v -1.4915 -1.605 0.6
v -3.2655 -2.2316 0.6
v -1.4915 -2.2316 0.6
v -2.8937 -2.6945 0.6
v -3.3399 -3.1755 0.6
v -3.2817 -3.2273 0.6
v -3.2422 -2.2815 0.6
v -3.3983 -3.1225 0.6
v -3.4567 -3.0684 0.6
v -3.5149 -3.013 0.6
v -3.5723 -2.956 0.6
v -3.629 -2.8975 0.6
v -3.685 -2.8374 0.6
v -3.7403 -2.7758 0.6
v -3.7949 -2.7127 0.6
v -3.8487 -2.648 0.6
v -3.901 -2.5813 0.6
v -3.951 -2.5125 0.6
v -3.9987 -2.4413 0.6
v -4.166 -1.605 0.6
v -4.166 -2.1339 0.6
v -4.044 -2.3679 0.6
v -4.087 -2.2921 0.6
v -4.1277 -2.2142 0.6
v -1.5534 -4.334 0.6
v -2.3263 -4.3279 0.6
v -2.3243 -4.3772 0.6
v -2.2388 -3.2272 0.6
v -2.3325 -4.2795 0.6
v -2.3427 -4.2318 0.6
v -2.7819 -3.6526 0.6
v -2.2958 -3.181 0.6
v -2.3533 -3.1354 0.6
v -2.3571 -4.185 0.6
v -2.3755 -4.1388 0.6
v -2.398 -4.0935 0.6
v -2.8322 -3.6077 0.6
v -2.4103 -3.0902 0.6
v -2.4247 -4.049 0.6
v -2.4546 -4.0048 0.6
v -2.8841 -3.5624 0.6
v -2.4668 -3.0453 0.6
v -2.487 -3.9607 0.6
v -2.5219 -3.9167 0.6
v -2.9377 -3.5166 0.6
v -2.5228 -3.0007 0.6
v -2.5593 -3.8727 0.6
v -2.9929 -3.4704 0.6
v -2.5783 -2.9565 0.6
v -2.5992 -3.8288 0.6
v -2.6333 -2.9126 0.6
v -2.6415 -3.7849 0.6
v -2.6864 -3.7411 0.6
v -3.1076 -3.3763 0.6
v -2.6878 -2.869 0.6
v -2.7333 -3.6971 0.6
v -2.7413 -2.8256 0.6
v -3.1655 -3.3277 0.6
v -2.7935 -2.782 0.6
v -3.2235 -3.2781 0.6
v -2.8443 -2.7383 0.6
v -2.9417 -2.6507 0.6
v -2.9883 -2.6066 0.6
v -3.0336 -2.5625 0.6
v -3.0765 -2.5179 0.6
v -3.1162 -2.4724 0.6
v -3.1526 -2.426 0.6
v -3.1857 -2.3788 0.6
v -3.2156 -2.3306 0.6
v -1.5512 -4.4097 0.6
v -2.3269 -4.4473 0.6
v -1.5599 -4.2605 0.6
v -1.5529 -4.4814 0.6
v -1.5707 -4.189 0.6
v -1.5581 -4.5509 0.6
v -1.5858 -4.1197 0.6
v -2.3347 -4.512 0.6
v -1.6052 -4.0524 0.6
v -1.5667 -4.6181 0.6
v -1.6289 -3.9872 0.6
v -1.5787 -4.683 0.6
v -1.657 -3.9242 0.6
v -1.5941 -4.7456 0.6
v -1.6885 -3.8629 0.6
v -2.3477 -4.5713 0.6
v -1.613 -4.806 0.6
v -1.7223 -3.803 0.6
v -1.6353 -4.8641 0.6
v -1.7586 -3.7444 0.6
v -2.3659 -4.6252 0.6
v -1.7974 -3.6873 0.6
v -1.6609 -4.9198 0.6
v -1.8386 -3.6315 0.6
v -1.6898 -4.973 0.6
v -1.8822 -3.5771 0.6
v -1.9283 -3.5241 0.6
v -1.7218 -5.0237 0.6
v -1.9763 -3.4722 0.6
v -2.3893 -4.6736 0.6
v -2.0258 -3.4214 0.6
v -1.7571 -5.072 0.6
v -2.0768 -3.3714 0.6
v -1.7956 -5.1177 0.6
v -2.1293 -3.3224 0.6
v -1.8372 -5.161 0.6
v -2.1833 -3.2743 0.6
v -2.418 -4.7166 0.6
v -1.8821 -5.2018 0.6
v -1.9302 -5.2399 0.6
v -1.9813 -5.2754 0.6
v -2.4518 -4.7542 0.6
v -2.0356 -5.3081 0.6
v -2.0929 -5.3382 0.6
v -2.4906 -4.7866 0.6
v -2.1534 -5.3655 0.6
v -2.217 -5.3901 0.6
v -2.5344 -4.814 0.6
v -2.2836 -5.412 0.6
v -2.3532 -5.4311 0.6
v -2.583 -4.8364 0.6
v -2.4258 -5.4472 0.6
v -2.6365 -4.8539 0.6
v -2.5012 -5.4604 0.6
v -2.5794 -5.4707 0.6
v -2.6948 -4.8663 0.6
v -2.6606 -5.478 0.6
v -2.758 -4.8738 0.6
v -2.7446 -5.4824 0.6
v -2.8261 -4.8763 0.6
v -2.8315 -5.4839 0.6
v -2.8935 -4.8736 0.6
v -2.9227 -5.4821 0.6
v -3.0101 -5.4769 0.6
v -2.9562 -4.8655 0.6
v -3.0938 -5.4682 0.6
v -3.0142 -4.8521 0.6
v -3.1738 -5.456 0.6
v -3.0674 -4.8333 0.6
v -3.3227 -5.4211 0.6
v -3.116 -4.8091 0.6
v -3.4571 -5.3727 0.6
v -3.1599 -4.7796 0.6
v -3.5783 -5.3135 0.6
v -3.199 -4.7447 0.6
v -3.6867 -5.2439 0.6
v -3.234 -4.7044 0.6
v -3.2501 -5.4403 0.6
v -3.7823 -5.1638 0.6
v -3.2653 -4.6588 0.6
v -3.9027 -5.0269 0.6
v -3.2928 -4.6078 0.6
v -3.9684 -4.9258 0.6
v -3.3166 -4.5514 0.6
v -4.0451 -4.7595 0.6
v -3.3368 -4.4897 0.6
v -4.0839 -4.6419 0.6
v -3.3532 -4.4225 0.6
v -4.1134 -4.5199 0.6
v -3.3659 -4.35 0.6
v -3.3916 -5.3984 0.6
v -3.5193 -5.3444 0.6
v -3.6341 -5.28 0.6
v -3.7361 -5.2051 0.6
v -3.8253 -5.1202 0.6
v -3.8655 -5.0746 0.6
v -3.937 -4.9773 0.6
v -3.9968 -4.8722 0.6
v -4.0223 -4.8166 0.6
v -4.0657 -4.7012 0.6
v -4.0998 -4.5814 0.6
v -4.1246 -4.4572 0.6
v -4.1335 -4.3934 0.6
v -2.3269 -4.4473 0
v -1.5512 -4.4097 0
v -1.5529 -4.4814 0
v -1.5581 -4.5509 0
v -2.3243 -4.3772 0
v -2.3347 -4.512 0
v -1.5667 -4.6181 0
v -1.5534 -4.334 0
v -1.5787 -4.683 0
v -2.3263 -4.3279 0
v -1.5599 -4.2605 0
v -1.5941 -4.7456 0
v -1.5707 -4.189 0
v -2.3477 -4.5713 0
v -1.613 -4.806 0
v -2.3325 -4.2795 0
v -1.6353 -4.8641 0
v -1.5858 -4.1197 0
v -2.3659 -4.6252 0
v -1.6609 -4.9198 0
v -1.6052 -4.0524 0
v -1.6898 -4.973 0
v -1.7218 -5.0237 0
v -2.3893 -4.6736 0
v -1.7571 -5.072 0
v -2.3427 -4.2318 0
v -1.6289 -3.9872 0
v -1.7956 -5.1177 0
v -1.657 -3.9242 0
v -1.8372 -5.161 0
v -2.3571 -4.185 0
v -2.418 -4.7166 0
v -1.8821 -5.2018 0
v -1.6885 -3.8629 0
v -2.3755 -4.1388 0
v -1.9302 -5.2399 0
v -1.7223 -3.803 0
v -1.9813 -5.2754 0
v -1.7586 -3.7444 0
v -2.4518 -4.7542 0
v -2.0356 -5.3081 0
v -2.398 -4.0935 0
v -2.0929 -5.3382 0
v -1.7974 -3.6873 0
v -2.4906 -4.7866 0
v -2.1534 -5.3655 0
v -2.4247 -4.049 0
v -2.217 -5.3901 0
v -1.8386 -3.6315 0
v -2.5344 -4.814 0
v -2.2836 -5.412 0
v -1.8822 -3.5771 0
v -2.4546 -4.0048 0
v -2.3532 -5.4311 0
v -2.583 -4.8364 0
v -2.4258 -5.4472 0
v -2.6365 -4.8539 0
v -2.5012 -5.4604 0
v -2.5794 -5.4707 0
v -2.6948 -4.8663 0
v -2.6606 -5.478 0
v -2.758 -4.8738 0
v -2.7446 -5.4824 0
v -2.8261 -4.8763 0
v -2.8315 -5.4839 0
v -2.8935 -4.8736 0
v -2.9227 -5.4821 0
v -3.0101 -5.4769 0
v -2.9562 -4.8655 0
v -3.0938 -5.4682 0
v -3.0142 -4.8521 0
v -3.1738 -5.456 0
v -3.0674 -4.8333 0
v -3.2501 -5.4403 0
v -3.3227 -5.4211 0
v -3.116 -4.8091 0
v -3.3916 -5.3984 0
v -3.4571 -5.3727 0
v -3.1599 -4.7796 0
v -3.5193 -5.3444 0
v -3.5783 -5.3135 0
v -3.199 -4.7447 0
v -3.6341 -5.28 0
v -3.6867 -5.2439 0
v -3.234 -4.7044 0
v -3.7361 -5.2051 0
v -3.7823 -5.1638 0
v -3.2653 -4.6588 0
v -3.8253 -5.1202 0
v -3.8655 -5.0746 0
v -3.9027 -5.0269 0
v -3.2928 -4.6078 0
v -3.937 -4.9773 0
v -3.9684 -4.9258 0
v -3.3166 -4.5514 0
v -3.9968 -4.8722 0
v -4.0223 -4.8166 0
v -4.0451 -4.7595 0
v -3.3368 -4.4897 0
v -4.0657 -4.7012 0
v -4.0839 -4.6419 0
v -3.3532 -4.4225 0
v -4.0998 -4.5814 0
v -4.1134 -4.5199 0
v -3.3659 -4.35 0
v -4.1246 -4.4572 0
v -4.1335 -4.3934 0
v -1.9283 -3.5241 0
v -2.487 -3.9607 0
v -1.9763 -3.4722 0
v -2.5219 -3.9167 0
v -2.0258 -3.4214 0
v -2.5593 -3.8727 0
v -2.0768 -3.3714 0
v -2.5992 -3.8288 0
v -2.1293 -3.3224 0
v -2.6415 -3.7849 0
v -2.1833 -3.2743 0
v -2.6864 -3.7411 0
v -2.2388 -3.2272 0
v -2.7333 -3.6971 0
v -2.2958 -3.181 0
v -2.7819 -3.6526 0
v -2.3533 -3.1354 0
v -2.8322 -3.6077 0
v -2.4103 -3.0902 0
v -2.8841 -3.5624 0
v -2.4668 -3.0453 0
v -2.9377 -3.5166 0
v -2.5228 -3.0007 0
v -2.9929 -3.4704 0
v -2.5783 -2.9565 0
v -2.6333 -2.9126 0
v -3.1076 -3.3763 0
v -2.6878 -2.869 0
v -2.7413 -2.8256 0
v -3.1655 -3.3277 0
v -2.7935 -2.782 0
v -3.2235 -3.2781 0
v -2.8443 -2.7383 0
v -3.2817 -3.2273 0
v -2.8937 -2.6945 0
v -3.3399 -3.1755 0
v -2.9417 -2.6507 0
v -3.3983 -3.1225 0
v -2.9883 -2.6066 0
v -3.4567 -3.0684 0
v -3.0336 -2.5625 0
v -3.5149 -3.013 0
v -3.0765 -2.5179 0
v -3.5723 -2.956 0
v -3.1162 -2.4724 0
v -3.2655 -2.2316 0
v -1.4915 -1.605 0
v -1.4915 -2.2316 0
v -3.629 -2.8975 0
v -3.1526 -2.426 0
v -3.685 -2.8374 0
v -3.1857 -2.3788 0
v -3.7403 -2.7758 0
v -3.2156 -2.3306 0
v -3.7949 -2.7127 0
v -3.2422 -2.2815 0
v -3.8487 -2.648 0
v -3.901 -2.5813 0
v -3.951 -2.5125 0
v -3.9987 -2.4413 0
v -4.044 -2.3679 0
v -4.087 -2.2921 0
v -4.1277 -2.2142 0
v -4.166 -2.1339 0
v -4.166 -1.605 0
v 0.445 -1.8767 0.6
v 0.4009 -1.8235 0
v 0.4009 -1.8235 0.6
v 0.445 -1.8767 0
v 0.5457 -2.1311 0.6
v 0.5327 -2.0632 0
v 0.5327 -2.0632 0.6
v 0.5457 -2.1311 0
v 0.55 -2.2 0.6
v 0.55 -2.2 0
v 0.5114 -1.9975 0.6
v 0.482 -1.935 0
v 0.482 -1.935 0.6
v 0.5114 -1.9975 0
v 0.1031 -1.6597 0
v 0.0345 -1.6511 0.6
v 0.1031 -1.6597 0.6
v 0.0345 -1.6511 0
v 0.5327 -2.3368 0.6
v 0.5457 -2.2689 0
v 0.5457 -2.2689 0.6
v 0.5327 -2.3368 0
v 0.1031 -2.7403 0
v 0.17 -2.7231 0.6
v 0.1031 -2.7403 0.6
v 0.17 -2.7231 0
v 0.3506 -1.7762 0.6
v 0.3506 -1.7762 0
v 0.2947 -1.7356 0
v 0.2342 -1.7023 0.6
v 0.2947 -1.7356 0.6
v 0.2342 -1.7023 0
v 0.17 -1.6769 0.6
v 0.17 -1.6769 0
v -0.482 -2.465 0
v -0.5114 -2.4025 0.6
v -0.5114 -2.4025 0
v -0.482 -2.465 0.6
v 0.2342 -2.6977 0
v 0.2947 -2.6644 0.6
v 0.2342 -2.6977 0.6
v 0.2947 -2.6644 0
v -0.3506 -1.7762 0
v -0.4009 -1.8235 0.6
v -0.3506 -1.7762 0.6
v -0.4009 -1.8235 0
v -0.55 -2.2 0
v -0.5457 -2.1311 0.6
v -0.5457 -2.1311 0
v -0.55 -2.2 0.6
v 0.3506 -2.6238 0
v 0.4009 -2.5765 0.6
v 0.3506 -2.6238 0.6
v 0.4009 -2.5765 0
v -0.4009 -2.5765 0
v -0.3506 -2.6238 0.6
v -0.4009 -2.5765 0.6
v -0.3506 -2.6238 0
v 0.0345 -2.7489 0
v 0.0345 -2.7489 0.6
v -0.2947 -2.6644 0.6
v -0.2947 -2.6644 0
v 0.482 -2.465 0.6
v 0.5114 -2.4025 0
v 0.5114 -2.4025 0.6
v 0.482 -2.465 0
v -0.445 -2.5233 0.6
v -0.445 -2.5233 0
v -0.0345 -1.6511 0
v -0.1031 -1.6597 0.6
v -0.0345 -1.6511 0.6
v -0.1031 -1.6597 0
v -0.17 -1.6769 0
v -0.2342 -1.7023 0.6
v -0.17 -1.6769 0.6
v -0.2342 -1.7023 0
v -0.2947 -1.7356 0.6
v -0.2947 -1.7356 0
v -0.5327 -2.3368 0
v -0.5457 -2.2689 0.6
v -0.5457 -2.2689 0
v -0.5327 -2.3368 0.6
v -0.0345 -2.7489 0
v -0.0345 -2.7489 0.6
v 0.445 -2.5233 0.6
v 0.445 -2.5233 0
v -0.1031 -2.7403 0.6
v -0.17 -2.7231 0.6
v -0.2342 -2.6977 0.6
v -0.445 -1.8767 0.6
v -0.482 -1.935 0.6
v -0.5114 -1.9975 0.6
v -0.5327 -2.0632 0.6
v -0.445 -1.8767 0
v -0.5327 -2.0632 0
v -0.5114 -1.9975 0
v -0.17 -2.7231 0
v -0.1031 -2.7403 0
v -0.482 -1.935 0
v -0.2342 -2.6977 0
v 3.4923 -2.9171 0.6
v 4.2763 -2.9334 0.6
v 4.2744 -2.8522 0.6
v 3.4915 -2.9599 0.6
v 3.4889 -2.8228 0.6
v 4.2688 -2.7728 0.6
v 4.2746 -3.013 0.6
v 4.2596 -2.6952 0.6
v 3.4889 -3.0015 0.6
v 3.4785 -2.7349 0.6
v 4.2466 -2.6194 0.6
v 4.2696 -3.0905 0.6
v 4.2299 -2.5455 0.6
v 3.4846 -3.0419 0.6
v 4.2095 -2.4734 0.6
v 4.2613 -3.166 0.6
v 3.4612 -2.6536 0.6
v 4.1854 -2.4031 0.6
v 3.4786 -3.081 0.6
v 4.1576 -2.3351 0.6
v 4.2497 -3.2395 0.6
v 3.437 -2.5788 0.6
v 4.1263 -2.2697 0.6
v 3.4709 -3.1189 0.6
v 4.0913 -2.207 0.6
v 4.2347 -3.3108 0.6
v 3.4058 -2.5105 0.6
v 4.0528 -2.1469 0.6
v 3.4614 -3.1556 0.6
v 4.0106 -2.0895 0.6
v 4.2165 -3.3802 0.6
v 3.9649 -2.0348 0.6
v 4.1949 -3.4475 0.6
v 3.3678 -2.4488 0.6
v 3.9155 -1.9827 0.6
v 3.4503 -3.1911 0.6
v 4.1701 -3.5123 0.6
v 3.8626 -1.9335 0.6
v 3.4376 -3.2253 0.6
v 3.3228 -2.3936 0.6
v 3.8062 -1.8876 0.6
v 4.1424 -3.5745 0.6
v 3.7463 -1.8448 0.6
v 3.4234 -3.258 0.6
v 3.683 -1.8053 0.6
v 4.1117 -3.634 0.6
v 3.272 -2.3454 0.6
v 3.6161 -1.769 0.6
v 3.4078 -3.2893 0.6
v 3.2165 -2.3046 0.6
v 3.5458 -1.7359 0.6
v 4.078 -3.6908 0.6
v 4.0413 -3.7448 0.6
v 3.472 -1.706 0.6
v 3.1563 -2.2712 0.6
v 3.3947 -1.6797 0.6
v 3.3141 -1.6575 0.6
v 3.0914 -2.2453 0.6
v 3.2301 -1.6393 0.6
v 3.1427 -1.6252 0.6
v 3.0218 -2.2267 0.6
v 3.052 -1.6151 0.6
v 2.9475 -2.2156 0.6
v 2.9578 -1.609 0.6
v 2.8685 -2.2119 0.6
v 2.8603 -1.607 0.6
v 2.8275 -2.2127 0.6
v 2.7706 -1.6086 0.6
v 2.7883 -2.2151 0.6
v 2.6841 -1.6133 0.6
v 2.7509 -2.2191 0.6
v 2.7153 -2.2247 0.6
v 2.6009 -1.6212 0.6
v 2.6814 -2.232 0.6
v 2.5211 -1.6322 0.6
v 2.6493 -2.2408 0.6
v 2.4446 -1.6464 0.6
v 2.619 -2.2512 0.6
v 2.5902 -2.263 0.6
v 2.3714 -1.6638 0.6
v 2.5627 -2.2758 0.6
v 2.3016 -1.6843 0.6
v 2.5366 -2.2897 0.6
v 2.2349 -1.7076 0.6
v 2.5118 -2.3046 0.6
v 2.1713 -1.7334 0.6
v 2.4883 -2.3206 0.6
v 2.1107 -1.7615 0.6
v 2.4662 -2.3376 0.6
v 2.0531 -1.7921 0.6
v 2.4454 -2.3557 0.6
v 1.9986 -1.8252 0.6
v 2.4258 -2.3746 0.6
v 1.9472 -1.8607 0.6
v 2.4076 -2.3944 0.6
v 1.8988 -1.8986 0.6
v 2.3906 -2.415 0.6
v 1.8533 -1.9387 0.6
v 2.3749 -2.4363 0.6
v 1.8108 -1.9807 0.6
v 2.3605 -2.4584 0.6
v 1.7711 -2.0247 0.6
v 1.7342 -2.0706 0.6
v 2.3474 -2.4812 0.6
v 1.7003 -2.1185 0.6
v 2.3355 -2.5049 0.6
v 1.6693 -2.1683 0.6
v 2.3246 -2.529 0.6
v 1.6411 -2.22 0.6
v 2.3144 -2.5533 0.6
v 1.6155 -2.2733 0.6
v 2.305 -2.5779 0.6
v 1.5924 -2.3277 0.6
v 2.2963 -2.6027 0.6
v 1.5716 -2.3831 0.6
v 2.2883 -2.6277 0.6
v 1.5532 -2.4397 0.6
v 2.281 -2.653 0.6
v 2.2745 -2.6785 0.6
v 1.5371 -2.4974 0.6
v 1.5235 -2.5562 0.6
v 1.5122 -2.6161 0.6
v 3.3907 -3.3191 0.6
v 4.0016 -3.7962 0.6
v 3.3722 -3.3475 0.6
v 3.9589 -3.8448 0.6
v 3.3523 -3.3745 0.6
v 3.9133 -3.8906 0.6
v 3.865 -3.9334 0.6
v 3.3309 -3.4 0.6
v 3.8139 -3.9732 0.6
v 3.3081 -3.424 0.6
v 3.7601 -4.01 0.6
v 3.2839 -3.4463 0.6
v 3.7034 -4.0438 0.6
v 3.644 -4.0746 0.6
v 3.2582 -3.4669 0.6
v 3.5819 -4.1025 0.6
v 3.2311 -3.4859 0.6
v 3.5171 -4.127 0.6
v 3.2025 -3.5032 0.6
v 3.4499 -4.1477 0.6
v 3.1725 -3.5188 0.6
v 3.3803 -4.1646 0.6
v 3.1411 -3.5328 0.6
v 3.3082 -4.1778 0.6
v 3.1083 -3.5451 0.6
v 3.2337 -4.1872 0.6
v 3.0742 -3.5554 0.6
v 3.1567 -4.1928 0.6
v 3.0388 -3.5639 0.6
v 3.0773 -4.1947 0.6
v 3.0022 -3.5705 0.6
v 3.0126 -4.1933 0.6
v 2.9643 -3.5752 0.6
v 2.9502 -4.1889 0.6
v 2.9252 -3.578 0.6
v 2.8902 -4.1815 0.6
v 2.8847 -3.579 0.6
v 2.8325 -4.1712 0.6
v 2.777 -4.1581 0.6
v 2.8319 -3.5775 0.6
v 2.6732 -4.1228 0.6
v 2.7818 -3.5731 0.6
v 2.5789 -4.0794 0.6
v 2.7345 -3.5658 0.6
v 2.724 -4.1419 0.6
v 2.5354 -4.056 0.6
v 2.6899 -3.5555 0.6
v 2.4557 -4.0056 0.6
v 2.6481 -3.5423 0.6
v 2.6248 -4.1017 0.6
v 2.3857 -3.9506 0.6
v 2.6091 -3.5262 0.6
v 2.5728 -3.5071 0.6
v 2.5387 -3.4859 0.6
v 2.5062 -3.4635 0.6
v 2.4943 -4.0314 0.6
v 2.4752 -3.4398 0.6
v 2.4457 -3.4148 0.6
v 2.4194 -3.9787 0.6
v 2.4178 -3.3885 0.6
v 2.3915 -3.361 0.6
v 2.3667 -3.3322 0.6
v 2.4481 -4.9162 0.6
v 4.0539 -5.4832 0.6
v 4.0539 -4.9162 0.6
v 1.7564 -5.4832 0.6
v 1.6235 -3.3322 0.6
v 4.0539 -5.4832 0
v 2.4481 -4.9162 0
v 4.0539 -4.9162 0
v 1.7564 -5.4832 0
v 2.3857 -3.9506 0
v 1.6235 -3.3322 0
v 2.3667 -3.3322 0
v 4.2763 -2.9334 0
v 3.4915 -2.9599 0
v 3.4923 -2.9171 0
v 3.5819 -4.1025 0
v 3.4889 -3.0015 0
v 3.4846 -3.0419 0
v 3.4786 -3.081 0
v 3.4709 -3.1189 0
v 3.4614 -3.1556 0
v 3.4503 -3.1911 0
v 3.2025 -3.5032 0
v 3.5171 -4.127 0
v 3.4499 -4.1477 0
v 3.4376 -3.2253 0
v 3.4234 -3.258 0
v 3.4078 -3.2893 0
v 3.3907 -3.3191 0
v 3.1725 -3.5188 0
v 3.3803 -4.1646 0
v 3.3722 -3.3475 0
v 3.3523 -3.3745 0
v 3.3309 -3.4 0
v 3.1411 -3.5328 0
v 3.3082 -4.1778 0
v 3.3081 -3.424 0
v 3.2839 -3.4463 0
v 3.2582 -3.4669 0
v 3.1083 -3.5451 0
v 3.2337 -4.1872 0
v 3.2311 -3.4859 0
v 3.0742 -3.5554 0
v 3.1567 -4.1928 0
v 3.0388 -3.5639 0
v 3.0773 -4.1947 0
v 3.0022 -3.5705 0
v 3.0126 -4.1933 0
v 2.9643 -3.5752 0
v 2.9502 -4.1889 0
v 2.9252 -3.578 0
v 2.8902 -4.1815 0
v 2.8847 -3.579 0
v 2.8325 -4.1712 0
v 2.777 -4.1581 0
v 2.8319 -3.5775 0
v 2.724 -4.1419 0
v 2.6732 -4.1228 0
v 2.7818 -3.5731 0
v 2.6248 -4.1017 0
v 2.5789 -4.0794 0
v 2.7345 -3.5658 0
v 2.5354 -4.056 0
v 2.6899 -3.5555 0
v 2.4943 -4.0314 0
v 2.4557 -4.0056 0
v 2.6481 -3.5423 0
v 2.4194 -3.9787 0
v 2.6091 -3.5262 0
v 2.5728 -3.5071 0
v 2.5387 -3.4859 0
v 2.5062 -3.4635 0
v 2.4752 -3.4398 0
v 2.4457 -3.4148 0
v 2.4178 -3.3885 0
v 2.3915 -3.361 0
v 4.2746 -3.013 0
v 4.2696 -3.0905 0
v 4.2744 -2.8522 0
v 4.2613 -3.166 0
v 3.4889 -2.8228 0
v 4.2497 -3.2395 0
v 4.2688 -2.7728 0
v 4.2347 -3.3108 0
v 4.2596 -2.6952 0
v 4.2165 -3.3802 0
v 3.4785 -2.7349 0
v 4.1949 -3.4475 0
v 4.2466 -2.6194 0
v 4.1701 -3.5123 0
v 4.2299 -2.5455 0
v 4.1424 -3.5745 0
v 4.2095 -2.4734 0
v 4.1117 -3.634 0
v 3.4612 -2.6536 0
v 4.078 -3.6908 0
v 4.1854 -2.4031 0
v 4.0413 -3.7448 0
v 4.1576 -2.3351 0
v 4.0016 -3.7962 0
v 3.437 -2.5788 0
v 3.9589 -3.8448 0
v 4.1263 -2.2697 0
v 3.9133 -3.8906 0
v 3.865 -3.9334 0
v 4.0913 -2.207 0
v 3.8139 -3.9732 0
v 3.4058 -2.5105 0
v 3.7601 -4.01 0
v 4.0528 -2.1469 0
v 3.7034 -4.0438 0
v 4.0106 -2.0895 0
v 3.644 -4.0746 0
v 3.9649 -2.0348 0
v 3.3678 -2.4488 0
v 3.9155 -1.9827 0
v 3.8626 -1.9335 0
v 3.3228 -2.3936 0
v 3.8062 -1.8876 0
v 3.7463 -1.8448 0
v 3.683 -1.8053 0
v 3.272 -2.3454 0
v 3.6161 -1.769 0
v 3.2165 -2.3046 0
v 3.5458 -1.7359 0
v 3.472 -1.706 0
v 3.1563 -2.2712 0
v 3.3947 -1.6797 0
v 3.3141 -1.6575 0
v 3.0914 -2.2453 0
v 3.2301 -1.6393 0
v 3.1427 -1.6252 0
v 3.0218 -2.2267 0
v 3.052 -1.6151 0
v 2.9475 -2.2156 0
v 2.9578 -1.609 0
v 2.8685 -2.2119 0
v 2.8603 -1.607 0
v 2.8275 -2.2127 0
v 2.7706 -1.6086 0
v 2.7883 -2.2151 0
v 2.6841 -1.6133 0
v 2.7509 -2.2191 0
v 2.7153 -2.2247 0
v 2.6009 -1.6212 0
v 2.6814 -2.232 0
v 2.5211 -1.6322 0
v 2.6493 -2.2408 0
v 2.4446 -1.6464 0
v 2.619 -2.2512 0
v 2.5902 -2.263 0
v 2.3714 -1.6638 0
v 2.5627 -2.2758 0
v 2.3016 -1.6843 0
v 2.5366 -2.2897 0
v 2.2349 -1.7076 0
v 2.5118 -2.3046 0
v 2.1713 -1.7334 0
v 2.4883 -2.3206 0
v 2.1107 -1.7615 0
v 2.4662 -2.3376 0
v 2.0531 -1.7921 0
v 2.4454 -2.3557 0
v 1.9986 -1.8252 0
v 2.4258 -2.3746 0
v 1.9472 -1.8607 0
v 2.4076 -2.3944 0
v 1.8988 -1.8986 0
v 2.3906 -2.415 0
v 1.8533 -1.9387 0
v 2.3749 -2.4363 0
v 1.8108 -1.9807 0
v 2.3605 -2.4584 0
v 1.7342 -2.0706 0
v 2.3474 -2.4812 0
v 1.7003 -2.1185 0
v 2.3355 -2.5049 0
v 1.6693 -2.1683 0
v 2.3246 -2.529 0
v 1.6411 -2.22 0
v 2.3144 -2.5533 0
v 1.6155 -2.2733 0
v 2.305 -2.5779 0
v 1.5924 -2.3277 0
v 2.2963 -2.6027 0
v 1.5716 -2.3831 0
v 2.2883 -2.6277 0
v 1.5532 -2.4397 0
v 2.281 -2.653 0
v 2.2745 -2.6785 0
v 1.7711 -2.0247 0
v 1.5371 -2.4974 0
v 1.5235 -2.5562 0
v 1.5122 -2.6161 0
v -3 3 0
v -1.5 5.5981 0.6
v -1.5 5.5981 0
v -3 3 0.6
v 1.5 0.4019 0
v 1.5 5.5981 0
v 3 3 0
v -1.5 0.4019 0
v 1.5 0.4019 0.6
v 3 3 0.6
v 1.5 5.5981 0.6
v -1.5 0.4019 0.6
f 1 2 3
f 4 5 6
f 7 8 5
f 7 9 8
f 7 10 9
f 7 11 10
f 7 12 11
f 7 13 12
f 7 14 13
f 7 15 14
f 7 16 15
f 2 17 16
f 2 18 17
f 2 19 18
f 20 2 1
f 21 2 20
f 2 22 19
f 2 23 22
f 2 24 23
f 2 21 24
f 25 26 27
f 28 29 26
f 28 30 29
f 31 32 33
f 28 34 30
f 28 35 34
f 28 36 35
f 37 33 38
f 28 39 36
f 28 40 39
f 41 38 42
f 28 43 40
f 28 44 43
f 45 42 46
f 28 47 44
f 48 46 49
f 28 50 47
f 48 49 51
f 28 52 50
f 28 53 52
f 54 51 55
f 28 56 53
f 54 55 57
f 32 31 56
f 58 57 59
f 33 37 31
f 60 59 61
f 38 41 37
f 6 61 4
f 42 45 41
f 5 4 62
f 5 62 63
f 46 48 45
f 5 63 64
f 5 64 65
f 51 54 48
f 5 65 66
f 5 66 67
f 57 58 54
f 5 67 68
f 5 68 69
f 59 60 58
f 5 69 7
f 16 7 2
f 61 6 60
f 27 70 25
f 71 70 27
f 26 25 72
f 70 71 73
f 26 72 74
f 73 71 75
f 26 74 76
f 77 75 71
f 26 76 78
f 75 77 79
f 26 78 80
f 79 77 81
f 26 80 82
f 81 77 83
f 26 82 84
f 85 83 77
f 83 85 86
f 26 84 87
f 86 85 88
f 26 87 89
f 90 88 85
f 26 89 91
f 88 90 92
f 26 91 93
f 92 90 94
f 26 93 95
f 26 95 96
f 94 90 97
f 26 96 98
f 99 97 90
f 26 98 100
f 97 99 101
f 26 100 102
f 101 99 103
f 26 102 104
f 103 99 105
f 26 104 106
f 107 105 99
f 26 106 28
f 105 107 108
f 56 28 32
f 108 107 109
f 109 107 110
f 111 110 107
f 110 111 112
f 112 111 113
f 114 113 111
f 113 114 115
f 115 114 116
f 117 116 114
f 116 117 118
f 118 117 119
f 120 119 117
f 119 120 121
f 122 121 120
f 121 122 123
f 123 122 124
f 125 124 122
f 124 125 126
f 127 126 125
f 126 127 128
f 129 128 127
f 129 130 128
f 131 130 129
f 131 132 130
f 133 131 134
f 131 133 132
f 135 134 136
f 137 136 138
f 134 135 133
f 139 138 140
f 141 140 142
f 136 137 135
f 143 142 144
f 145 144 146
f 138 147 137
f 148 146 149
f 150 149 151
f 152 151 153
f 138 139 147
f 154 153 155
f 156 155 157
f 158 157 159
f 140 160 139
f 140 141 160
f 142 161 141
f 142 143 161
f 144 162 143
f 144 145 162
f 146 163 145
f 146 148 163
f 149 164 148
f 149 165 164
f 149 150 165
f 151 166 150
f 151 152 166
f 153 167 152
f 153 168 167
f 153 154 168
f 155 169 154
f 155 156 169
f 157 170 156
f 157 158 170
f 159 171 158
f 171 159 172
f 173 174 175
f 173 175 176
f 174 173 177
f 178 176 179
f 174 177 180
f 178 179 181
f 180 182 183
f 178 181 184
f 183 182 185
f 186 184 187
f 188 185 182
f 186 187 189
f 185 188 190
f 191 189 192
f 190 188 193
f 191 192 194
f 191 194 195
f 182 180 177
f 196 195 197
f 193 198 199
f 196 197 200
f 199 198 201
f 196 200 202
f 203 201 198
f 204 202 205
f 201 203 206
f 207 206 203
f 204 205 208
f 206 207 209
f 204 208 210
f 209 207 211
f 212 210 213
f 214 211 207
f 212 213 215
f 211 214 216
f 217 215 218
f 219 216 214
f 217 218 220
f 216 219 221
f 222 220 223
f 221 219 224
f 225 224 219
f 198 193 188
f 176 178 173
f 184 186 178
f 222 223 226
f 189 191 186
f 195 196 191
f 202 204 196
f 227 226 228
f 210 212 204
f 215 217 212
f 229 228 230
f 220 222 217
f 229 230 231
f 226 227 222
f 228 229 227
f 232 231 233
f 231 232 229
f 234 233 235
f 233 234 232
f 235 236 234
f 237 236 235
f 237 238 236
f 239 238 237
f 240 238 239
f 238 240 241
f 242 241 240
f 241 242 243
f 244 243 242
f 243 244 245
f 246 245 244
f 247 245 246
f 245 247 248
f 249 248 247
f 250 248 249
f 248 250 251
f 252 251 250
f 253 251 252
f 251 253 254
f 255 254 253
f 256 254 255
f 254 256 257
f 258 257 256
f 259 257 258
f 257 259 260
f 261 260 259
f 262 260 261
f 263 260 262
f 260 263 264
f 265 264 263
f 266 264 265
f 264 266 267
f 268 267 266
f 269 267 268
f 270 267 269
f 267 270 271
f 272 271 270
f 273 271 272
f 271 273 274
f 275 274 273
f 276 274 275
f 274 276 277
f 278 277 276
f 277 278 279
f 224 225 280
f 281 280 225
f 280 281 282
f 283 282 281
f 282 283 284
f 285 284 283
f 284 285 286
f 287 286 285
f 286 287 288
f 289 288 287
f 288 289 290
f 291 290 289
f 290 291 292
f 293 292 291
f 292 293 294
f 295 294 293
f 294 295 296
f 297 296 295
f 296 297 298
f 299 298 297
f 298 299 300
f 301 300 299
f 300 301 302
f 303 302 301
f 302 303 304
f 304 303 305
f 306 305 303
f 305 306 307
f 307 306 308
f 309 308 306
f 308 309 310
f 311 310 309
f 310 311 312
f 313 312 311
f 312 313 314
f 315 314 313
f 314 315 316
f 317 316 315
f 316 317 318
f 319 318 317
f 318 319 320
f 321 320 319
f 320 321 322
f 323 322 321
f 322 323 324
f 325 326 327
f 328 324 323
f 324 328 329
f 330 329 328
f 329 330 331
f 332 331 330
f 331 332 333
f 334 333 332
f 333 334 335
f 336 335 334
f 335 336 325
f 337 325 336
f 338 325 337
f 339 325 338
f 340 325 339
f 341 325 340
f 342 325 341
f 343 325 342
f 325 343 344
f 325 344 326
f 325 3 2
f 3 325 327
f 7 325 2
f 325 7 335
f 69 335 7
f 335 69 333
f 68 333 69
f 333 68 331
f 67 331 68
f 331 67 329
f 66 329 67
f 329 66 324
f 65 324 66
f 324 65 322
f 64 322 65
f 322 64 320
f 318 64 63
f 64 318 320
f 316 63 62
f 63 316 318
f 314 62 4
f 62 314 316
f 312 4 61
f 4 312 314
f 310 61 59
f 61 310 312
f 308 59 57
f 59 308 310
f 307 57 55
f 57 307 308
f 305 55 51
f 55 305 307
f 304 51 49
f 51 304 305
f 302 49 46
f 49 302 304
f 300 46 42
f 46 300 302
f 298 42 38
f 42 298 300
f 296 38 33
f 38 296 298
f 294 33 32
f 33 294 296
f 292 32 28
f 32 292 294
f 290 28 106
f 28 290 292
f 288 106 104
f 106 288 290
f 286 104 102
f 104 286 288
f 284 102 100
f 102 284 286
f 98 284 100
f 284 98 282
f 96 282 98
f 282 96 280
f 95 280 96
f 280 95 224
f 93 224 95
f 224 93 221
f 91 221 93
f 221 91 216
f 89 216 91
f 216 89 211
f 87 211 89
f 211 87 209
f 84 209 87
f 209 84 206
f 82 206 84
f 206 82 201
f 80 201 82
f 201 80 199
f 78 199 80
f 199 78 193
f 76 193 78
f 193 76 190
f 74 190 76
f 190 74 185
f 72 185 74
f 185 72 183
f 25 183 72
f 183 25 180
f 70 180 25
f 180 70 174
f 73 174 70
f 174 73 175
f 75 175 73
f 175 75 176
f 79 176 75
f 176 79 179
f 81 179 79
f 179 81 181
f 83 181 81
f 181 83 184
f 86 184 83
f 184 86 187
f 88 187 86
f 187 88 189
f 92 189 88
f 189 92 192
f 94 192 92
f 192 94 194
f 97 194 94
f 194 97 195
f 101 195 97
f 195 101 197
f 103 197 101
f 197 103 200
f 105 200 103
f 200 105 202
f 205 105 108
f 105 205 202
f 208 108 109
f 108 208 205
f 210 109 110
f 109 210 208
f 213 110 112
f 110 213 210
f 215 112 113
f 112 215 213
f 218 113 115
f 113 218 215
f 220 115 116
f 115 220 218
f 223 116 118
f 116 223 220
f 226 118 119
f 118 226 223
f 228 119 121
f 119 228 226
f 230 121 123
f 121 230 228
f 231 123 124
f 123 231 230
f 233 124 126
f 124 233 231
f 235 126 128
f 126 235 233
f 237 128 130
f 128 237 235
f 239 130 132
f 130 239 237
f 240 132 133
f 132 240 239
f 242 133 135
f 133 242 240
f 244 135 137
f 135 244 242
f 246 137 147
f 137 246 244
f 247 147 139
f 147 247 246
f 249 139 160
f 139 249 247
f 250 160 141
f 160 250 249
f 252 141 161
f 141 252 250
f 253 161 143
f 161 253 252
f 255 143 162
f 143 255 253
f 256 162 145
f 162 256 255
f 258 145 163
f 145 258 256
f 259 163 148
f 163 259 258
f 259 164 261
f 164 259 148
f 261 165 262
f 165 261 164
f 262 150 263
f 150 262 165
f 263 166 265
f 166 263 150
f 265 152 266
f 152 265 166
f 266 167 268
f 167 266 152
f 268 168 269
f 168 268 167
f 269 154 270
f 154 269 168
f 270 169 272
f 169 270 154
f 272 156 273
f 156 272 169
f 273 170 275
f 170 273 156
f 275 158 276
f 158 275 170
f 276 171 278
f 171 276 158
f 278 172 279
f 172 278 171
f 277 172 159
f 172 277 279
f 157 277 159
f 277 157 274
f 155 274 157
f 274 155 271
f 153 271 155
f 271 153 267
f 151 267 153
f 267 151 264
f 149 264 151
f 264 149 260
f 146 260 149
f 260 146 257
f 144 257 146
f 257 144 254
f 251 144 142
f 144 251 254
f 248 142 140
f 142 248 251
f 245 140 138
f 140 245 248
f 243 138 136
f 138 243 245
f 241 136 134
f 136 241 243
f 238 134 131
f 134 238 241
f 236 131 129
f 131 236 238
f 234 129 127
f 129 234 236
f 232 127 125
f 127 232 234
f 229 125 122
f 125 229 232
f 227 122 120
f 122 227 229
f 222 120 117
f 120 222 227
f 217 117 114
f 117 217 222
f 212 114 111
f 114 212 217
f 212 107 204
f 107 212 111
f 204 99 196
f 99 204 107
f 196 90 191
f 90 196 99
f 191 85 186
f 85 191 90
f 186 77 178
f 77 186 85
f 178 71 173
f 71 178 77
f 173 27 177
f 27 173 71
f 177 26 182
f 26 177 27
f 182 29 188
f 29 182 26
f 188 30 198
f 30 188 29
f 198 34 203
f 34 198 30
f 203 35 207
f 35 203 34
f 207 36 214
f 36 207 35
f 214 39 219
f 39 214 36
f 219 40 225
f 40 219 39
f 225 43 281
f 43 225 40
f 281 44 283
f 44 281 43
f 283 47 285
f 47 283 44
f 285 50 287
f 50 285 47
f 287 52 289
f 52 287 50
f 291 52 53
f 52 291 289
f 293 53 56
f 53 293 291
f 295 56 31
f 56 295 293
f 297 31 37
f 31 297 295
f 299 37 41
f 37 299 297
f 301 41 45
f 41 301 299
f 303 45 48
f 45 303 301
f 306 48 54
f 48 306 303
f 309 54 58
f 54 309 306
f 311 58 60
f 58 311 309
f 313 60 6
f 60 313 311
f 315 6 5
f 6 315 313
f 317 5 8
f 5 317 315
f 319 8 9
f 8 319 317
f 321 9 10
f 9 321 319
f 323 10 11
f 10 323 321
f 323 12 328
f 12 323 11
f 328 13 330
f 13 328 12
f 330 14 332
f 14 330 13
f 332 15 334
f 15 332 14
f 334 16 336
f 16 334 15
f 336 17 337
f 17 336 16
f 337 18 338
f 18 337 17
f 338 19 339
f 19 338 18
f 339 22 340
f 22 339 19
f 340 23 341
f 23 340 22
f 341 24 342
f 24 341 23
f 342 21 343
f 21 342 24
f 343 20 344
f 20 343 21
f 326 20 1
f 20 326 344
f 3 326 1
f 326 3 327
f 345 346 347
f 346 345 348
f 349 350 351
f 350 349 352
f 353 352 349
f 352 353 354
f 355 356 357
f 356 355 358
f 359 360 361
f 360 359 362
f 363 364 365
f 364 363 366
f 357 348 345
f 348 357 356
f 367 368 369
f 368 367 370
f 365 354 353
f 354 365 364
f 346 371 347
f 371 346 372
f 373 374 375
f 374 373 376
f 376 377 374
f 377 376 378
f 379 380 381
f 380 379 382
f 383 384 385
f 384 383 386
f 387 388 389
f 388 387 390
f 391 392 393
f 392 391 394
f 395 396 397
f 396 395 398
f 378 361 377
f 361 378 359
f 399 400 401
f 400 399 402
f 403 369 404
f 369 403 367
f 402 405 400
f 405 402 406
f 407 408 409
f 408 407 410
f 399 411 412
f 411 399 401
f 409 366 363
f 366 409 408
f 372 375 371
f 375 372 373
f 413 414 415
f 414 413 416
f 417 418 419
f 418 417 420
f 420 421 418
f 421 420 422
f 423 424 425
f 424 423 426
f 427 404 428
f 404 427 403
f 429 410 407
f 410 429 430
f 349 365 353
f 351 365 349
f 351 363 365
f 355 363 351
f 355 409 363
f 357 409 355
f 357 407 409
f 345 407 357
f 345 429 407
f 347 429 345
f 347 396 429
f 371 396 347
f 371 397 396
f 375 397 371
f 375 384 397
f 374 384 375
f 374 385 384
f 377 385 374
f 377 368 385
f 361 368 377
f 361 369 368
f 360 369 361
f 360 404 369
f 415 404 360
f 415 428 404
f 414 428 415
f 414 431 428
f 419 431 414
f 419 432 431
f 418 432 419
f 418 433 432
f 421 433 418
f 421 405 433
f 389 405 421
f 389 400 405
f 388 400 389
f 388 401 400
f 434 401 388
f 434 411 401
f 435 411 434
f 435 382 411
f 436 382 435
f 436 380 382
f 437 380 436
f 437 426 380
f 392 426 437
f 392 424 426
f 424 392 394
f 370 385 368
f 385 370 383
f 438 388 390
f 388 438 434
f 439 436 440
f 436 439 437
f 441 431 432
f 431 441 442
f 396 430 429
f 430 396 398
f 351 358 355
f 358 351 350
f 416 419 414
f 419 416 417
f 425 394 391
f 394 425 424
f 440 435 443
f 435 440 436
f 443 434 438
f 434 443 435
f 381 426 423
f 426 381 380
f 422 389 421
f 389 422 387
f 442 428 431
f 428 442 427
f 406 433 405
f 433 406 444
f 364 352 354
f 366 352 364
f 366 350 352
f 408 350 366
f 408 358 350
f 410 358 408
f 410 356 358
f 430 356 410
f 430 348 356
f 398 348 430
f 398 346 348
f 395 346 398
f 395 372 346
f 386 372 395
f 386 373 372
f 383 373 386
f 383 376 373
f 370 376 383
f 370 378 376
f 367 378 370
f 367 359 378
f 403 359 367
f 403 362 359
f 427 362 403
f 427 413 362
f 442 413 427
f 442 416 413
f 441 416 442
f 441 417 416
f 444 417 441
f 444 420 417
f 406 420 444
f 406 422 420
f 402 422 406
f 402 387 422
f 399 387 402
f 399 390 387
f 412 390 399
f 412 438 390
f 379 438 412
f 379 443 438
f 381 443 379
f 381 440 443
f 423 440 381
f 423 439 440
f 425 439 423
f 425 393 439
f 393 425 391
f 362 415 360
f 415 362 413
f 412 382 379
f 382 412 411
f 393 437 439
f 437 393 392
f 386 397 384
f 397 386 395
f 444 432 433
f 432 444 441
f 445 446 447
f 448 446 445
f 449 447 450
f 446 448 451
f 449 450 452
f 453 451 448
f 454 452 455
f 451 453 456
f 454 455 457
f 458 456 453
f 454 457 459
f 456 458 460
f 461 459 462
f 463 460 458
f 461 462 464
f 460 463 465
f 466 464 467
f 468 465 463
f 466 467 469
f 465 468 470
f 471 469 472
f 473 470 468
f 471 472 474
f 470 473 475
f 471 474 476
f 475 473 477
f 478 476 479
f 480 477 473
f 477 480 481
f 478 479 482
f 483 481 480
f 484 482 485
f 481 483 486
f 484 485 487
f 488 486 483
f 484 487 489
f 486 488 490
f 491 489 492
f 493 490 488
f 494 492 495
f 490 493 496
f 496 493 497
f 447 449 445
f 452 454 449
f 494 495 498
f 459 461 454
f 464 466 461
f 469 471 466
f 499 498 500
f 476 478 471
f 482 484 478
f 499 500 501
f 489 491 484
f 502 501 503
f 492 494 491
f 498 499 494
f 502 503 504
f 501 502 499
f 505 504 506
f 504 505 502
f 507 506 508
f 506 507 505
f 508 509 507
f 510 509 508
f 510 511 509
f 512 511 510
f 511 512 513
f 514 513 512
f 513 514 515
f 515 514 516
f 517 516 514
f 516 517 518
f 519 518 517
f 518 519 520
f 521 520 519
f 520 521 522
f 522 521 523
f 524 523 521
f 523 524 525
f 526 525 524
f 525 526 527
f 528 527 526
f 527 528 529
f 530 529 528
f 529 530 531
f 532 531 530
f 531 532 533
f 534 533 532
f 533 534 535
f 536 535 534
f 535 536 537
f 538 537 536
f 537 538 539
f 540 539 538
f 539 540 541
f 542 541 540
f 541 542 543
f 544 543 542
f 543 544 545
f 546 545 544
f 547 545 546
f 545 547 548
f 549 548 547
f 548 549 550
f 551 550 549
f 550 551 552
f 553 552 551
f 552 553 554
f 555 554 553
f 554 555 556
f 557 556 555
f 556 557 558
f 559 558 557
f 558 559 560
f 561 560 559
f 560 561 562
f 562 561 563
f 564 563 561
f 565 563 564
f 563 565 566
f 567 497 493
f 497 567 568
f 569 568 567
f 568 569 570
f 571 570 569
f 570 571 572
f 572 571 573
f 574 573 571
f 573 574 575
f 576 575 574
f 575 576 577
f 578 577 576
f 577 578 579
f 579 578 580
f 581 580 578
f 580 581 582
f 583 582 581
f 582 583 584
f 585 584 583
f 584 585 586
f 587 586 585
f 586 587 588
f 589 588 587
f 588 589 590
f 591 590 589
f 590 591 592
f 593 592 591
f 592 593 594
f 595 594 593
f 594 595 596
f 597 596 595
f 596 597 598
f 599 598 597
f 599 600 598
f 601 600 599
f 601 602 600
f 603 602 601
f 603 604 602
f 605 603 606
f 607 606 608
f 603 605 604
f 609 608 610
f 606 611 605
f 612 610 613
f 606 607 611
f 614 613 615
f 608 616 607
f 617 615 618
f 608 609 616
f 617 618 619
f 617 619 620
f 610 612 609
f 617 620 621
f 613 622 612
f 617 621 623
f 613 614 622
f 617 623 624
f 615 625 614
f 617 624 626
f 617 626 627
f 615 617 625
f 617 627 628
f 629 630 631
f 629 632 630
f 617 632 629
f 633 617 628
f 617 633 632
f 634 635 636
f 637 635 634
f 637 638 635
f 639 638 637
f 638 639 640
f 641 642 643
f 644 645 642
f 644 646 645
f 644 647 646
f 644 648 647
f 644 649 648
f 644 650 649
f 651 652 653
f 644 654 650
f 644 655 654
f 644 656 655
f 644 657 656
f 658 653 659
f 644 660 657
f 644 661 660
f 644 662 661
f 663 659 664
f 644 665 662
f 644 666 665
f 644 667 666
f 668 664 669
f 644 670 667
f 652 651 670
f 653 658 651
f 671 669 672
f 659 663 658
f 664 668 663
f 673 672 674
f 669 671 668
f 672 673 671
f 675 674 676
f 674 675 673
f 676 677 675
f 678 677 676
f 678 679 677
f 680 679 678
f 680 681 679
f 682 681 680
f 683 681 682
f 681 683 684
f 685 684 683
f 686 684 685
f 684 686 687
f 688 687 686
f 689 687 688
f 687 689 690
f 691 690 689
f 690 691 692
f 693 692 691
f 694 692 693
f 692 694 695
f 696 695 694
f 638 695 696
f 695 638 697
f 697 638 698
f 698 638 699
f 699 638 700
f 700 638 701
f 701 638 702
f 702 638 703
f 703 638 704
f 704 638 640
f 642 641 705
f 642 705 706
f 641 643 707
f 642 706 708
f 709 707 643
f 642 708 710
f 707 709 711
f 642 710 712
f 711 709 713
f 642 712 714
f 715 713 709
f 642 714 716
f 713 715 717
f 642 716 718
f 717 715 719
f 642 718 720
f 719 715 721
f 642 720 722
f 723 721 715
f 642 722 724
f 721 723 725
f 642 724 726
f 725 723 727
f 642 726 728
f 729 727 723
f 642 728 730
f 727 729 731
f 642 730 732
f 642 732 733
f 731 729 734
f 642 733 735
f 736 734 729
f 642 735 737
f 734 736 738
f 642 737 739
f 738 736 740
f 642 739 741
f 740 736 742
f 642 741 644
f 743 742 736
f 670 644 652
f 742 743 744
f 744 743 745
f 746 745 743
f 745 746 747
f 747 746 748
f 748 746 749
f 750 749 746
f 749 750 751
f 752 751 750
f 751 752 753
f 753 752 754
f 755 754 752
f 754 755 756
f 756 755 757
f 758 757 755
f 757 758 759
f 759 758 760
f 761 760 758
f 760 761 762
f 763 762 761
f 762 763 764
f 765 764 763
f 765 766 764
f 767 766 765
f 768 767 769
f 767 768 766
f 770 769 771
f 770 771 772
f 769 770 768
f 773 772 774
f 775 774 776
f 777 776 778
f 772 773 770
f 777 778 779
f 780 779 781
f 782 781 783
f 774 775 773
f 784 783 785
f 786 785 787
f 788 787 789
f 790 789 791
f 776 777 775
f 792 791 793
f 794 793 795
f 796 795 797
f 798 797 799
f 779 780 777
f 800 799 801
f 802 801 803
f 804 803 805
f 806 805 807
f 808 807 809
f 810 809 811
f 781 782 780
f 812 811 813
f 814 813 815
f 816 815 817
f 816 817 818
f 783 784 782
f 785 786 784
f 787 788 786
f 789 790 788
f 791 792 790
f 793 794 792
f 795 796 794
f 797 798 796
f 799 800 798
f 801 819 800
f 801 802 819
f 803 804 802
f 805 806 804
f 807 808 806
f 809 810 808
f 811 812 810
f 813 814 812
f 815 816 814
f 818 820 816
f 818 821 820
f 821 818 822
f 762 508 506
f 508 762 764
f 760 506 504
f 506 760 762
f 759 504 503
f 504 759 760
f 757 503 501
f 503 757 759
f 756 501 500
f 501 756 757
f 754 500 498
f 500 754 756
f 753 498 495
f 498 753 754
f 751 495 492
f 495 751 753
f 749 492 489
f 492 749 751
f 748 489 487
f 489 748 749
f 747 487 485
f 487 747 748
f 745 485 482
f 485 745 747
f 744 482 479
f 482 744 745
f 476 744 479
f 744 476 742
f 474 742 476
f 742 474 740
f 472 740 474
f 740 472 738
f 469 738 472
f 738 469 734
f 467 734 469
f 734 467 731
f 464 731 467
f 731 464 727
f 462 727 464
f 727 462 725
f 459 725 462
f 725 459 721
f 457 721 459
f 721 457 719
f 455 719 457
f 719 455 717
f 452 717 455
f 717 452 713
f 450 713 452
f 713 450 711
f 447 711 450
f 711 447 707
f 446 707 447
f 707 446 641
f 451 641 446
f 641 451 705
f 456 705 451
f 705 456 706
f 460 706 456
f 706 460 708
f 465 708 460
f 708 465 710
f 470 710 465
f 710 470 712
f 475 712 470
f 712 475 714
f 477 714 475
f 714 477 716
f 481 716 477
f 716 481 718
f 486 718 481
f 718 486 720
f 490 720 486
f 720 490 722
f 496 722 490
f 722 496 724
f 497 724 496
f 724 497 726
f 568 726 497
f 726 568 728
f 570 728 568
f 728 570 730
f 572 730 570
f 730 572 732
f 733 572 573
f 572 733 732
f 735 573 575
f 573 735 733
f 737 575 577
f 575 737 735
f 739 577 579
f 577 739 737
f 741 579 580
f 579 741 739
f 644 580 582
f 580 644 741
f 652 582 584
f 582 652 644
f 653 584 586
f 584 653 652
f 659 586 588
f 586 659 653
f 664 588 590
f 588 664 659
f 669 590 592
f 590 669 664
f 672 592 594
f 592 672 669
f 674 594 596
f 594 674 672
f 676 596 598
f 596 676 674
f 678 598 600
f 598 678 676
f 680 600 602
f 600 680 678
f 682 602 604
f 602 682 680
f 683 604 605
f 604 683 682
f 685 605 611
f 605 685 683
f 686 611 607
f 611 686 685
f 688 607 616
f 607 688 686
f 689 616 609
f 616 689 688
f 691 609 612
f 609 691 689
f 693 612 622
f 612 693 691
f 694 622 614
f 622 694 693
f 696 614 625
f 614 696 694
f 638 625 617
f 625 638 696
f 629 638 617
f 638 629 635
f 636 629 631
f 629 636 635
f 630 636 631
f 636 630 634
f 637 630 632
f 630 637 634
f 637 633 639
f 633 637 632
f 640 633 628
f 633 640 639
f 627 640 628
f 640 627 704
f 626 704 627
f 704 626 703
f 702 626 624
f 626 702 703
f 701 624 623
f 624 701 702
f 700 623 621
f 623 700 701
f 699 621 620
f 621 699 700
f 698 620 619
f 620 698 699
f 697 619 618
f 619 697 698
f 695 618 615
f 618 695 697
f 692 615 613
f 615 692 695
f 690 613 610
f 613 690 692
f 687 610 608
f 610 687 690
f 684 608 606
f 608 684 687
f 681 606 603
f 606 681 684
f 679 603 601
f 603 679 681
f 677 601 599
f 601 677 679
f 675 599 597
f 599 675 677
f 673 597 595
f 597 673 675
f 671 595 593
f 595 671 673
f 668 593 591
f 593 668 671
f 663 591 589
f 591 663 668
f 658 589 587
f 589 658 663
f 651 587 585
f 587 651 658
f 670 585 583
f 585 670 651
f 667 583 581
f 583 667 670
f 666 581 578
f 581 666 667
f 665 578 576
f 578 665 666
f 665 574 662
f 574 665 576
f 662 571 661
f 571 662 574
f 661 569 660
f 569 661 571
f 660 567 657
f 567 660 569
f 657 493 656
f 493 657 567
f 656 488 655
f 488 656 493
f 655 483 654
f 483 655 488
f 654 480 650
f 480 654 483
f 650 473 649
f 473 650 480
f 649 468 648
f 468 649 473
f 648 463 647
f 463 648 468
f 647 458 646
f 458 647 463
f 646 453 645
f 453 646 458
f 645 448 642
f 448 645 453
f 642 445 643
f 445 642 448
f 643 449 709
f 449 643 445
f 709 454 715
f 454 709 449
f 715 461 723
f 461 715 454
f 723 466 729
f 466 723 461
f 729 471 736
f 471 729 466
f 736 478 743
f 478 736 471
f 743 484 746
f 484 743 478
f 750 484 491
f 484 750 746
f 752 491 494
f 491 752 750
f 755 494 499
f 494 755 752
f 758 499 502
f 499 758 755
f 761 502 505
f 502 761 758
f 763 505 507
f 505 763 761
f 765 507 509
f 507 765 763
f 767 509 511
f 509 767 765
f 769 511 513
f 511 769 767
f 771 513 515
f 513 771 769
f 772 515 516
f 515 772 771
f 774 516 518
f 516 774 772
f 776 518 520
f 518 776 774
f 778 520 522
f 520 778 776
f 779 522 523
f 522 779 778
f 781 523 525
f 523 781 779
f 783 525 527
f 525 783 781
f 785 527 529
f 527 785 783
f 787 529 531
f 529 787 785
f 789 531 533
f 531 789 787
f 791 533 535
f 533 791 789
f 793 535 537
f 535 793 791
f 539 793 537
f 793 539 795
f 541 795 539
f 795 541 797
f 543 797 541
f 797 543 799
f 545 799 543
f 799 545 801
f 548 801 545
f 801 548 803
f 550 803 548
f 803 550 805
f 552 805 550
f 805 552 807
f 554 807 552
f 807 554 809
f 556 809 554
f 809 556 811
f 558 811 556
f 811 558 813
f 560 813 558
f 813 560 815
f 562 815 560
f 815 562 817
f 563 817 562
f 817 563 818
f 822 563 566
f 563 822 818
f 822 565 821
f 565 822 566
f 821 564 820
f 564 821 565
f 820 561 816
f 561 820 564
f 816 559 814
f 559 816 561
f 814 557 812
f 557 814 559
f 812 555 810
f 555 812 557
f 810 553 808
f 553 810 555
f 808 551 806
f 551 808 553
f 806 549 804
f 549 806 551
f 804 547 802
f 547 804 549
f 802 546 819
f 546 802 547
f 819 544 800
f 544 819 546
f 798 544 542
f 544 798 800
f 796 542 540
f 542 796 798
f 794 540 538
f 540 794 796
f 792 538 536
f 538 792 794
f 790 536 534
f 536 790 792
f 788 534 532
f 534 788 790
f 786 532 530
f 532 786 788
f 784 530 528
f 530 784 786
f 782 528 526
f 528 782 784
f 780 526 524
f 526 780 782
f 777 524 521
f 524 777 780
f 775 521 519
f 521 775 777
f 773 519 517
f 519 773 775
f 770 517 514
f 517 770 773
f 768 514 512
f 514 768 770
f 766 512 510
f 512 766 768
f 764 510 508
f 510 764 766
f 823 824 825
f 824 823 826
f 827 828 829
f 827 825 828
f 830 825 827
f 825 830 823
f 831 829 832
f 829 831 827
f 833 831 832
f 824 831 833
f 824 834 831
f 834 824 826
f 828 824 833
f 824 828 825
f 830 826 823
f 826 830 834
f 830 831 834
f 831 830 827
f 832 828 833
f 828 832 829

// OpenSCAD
$fn = 50;

difference() {
	union() {
		translate(v = [-2.85, -3.5, 0.6]) {
			rotate(a = [180, 0, 0]) {
				linear_extrude(height = 0.6) {
					text(font = "Liberation Sans:style=Bold", halign = "center", size = 4.0, text = "2", valign = "center");
				}
			}
		}
		translate(v = [0.0, -2.2, 0.0]) {
			cylinder(h = 0.6, r = 0.55);
		}
		translate(v = [2.85, -3.5, 0.6]) {
			rotate(a = [180, 0, 0]) {
				linear_extrude(height = 0.6) {
					text(font = "Liberation Sans:style=Bold", halign = "center", size = 4.0, text = "5", valign = "center");
				}
			}
		}
		translate(v = [0, 3, 0]) {
			linear_extrude(height = 0.6) {
				polygon(points = [[3.0, 0.0], [1.5000000000000004, 2.598076211353316], [-1.4999999999999993, 2.598076211353316], [-3.0, 3.6739403974420594e-16], [-1.5000000000000013, -2.5980762113533156], [1.499999999999998, -2.598076211353317]]);
			}
		}
	}
	union();
}
